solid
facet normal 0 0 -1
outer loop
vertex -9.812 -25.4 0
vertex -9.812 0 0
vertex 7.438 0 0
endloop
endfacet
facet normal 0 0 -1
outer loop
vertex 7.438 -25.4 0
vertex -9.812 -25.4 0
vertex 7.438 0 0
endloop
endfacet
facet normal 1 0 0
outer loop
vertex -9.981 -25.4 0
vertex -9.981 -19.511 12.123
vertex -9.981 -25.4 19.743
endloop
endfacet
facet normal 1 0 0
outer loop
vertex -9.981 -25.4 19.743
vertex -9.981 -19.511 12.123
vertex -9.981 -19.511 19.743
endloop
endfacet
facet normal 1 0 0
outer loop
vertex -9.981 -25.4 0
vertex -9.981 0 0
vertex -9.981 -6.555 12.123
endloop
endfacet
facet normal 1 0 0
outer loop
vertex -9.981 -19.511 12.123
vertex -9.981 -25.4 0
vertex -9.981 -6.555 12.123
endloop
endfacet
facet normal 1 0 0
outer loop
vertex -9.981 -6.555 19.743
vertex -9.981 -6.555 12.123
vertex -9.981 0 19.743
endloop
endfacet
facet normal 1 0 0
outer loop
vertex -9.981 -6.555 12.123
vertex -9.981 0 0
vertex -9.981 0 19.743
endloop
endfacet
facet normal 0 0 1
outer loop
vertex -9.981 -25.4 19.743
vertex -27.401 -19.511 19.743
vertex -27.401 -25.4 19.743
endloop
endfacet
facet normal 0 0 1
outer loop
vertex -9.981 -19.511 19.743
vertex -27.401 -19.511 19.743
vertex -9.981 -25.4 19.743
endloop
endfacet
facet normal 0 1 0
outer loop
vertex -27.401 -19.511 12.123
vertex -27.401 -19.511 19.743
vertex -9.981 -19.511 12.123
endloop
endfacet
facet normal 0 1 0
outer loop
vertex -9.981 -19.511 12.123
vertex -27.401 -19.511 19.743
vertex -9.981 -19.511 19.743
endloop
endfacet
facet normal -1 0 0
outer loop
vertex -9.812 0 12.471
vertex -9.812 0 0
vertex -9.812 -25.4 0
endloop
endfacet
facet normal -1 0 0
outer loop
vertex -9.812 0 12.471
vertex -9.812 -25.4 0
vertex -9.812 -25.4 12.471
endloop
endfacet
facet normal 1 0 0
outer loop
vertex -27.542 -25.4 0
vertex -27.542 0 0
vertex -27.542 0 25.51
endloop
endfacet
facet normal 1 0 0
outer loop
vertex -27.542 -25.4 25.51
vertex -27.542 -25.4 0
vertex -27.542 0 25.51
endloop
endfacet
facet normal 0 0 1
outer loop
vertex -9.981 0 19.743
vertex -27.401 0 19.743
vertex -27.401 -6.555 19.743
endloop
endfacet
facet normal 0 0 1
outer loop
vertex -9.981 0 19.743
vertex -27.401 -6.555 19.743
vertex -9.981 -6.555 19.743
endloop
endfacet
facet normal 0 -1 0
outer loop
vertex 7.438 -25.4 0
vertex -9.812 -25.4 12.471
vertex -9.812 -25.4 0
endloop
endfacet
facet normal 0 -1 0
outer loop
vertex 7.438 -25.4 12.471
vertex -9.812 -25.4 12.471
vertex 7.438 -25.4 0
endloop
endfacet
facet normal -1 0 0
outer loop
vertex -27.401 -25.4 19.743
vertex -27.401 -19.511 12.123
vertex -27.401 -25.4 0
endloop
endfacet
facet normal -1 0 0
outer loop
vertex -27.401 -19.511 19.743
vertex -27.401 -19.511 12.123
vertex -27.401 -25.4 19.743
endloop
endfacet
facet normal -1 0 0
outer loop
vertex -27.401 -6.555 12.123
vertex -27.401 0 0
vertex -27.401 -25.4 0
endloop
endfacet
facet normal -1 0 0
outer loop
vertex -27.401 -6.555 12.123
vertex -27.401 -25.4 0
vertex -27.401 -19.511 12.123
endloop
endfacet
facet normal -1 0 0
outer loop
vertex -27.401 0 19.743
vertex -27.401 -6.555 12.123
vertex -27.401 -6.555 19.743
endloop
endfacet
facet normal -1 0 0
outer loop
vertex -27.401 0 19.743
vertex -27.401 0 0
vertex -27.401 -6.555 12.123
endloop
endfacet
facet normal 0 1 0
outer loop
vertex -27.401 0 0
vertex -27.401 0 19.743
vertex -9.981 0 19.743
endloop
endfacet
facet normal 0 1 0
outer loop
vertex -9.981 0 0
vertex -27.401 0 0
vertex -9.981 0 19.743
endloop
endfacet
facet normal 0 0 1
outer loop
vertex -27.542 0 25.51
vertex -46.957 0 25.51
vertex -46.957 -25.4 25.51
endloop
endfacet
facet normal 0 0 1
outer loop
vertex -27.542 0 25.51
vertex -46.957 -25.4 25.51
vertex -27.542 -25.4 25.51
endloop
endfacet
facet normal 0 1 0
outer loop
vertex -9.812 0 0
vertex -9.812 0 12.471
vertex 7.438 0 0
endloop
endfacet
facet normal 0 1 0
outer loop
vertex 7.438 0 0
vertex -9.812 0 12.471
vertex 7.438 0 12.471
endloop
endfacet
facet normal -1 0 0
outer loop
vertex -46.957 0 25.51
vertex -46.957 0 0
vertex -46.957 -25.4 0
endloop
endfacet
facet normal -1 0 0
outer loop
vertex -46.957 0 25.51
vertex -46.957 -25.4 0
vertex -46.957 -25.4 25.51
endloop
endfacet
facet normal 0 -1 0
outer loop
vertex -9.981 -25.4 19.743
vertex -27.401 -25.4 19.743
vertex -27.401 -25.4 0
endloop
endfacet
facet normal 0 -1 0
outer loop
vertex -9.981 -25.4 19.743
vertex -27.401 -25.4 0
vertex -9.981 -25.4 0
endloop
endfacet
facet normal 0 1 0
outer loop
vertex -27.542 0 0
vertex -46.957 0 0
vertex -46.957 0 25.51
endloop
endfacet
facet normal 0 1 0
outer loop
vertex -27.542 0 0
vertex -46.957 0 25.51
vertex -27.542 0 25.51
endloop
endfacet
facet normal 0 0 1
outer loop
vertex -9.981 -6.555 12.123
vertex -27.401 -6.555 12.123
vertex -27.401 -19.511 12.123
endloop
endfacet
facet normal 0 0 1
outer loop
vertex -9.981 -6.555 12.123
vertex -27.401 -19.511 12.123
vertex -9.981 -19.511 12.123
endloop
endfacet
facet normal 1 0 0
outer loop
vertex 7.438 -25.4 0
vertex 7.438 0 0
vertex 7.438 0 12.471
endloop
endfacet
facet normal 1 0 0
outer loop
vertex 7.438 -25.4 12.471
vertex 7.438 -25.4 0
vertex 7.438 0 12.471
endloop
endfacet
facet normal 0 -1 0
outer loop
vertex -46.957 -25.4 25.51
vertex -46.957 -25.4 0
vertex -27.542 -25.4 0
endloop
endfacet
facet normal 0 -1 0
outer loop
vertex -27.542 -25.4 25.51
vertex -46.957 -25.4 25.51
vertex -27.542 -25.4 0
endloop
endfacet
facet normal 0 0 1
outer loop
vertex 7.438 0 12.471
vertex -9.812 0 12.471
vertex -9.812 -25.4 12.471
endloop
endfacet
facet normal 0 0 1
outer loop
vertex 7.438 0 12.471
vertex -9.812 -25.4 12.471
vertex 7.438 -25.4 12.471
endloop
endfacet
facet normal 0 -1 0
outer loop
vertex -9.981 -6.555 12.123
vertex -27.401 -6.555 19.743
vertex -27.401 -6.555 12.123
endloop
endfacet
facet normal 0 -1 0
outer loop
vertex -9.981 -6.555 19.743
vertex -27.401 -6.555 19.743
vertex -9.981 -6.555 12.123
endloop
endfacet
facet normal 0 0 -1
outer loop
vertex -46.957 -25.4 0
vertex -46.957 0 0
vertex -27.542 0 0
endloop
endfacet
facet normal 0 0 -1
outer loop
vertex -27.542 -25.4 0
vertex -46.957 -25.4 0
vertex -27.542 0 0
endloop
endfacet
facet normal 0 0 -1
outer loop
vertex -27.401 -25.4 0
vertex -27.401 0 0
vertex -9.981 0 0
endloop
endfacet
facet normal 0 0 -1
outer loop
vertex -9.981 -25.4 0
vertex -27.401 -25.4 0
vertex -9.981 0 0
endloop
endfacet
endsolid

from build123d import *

# Parameters (mm, degrees)
F0_W     = 19.414781
F0_H     = 25.510123
F3_DEPTH = 25.4
F1_W     = 17.419759
F1_H     = 19.743383
F4_DEPTH = 25.4
F2_W     = 17.250634
F2_H     = 12.471057
F5_DEPTH = 25.4
F6_W     = 17.419759
F6_H     = 12.955732
F7_DEPTH = 7.62


with BuildPart() as f3:
    # F0 (on Front) → F3 (new body)
    with BuildSketch(Plane.XZ):
        with Locations((-37.249286, 12.755062)):
            Rectangle(F0_W, F0_H)
    extrude(amount=F3_DEPTH)


with BuildPart() as f4:
    # F1 (on Front) → F4 (new body)
    with BuildSketch(Plane.XZ):
        with Locations((-18.691374, 9.871691)):
            Rectangle(F1_W, F1_H)
    extrude(amount=F4_DEPTH)

    # F6 (on face) → F7 (cut)
    with BuildSketch(Plane.XY.offset(19.743383)):
        with Locations((-18.691374, -13.032658)):
            Rectangle(F6_W, F6_H)
    extrude(amount=-F7_DEPTH, mode=Mode.SUBTRACT)


with BuildPart() as f5:
    # F2 (on Front) → F5 (new body)
    with BuildSketch(Plane.XZ):
        with Locations((-1.187055, 6.235529)):
            Rectangle(F2_W, F2_H)
    extrude(amount=F5_DEPTH)


solid = Compound([f3.part, f4.part, f5.part])
